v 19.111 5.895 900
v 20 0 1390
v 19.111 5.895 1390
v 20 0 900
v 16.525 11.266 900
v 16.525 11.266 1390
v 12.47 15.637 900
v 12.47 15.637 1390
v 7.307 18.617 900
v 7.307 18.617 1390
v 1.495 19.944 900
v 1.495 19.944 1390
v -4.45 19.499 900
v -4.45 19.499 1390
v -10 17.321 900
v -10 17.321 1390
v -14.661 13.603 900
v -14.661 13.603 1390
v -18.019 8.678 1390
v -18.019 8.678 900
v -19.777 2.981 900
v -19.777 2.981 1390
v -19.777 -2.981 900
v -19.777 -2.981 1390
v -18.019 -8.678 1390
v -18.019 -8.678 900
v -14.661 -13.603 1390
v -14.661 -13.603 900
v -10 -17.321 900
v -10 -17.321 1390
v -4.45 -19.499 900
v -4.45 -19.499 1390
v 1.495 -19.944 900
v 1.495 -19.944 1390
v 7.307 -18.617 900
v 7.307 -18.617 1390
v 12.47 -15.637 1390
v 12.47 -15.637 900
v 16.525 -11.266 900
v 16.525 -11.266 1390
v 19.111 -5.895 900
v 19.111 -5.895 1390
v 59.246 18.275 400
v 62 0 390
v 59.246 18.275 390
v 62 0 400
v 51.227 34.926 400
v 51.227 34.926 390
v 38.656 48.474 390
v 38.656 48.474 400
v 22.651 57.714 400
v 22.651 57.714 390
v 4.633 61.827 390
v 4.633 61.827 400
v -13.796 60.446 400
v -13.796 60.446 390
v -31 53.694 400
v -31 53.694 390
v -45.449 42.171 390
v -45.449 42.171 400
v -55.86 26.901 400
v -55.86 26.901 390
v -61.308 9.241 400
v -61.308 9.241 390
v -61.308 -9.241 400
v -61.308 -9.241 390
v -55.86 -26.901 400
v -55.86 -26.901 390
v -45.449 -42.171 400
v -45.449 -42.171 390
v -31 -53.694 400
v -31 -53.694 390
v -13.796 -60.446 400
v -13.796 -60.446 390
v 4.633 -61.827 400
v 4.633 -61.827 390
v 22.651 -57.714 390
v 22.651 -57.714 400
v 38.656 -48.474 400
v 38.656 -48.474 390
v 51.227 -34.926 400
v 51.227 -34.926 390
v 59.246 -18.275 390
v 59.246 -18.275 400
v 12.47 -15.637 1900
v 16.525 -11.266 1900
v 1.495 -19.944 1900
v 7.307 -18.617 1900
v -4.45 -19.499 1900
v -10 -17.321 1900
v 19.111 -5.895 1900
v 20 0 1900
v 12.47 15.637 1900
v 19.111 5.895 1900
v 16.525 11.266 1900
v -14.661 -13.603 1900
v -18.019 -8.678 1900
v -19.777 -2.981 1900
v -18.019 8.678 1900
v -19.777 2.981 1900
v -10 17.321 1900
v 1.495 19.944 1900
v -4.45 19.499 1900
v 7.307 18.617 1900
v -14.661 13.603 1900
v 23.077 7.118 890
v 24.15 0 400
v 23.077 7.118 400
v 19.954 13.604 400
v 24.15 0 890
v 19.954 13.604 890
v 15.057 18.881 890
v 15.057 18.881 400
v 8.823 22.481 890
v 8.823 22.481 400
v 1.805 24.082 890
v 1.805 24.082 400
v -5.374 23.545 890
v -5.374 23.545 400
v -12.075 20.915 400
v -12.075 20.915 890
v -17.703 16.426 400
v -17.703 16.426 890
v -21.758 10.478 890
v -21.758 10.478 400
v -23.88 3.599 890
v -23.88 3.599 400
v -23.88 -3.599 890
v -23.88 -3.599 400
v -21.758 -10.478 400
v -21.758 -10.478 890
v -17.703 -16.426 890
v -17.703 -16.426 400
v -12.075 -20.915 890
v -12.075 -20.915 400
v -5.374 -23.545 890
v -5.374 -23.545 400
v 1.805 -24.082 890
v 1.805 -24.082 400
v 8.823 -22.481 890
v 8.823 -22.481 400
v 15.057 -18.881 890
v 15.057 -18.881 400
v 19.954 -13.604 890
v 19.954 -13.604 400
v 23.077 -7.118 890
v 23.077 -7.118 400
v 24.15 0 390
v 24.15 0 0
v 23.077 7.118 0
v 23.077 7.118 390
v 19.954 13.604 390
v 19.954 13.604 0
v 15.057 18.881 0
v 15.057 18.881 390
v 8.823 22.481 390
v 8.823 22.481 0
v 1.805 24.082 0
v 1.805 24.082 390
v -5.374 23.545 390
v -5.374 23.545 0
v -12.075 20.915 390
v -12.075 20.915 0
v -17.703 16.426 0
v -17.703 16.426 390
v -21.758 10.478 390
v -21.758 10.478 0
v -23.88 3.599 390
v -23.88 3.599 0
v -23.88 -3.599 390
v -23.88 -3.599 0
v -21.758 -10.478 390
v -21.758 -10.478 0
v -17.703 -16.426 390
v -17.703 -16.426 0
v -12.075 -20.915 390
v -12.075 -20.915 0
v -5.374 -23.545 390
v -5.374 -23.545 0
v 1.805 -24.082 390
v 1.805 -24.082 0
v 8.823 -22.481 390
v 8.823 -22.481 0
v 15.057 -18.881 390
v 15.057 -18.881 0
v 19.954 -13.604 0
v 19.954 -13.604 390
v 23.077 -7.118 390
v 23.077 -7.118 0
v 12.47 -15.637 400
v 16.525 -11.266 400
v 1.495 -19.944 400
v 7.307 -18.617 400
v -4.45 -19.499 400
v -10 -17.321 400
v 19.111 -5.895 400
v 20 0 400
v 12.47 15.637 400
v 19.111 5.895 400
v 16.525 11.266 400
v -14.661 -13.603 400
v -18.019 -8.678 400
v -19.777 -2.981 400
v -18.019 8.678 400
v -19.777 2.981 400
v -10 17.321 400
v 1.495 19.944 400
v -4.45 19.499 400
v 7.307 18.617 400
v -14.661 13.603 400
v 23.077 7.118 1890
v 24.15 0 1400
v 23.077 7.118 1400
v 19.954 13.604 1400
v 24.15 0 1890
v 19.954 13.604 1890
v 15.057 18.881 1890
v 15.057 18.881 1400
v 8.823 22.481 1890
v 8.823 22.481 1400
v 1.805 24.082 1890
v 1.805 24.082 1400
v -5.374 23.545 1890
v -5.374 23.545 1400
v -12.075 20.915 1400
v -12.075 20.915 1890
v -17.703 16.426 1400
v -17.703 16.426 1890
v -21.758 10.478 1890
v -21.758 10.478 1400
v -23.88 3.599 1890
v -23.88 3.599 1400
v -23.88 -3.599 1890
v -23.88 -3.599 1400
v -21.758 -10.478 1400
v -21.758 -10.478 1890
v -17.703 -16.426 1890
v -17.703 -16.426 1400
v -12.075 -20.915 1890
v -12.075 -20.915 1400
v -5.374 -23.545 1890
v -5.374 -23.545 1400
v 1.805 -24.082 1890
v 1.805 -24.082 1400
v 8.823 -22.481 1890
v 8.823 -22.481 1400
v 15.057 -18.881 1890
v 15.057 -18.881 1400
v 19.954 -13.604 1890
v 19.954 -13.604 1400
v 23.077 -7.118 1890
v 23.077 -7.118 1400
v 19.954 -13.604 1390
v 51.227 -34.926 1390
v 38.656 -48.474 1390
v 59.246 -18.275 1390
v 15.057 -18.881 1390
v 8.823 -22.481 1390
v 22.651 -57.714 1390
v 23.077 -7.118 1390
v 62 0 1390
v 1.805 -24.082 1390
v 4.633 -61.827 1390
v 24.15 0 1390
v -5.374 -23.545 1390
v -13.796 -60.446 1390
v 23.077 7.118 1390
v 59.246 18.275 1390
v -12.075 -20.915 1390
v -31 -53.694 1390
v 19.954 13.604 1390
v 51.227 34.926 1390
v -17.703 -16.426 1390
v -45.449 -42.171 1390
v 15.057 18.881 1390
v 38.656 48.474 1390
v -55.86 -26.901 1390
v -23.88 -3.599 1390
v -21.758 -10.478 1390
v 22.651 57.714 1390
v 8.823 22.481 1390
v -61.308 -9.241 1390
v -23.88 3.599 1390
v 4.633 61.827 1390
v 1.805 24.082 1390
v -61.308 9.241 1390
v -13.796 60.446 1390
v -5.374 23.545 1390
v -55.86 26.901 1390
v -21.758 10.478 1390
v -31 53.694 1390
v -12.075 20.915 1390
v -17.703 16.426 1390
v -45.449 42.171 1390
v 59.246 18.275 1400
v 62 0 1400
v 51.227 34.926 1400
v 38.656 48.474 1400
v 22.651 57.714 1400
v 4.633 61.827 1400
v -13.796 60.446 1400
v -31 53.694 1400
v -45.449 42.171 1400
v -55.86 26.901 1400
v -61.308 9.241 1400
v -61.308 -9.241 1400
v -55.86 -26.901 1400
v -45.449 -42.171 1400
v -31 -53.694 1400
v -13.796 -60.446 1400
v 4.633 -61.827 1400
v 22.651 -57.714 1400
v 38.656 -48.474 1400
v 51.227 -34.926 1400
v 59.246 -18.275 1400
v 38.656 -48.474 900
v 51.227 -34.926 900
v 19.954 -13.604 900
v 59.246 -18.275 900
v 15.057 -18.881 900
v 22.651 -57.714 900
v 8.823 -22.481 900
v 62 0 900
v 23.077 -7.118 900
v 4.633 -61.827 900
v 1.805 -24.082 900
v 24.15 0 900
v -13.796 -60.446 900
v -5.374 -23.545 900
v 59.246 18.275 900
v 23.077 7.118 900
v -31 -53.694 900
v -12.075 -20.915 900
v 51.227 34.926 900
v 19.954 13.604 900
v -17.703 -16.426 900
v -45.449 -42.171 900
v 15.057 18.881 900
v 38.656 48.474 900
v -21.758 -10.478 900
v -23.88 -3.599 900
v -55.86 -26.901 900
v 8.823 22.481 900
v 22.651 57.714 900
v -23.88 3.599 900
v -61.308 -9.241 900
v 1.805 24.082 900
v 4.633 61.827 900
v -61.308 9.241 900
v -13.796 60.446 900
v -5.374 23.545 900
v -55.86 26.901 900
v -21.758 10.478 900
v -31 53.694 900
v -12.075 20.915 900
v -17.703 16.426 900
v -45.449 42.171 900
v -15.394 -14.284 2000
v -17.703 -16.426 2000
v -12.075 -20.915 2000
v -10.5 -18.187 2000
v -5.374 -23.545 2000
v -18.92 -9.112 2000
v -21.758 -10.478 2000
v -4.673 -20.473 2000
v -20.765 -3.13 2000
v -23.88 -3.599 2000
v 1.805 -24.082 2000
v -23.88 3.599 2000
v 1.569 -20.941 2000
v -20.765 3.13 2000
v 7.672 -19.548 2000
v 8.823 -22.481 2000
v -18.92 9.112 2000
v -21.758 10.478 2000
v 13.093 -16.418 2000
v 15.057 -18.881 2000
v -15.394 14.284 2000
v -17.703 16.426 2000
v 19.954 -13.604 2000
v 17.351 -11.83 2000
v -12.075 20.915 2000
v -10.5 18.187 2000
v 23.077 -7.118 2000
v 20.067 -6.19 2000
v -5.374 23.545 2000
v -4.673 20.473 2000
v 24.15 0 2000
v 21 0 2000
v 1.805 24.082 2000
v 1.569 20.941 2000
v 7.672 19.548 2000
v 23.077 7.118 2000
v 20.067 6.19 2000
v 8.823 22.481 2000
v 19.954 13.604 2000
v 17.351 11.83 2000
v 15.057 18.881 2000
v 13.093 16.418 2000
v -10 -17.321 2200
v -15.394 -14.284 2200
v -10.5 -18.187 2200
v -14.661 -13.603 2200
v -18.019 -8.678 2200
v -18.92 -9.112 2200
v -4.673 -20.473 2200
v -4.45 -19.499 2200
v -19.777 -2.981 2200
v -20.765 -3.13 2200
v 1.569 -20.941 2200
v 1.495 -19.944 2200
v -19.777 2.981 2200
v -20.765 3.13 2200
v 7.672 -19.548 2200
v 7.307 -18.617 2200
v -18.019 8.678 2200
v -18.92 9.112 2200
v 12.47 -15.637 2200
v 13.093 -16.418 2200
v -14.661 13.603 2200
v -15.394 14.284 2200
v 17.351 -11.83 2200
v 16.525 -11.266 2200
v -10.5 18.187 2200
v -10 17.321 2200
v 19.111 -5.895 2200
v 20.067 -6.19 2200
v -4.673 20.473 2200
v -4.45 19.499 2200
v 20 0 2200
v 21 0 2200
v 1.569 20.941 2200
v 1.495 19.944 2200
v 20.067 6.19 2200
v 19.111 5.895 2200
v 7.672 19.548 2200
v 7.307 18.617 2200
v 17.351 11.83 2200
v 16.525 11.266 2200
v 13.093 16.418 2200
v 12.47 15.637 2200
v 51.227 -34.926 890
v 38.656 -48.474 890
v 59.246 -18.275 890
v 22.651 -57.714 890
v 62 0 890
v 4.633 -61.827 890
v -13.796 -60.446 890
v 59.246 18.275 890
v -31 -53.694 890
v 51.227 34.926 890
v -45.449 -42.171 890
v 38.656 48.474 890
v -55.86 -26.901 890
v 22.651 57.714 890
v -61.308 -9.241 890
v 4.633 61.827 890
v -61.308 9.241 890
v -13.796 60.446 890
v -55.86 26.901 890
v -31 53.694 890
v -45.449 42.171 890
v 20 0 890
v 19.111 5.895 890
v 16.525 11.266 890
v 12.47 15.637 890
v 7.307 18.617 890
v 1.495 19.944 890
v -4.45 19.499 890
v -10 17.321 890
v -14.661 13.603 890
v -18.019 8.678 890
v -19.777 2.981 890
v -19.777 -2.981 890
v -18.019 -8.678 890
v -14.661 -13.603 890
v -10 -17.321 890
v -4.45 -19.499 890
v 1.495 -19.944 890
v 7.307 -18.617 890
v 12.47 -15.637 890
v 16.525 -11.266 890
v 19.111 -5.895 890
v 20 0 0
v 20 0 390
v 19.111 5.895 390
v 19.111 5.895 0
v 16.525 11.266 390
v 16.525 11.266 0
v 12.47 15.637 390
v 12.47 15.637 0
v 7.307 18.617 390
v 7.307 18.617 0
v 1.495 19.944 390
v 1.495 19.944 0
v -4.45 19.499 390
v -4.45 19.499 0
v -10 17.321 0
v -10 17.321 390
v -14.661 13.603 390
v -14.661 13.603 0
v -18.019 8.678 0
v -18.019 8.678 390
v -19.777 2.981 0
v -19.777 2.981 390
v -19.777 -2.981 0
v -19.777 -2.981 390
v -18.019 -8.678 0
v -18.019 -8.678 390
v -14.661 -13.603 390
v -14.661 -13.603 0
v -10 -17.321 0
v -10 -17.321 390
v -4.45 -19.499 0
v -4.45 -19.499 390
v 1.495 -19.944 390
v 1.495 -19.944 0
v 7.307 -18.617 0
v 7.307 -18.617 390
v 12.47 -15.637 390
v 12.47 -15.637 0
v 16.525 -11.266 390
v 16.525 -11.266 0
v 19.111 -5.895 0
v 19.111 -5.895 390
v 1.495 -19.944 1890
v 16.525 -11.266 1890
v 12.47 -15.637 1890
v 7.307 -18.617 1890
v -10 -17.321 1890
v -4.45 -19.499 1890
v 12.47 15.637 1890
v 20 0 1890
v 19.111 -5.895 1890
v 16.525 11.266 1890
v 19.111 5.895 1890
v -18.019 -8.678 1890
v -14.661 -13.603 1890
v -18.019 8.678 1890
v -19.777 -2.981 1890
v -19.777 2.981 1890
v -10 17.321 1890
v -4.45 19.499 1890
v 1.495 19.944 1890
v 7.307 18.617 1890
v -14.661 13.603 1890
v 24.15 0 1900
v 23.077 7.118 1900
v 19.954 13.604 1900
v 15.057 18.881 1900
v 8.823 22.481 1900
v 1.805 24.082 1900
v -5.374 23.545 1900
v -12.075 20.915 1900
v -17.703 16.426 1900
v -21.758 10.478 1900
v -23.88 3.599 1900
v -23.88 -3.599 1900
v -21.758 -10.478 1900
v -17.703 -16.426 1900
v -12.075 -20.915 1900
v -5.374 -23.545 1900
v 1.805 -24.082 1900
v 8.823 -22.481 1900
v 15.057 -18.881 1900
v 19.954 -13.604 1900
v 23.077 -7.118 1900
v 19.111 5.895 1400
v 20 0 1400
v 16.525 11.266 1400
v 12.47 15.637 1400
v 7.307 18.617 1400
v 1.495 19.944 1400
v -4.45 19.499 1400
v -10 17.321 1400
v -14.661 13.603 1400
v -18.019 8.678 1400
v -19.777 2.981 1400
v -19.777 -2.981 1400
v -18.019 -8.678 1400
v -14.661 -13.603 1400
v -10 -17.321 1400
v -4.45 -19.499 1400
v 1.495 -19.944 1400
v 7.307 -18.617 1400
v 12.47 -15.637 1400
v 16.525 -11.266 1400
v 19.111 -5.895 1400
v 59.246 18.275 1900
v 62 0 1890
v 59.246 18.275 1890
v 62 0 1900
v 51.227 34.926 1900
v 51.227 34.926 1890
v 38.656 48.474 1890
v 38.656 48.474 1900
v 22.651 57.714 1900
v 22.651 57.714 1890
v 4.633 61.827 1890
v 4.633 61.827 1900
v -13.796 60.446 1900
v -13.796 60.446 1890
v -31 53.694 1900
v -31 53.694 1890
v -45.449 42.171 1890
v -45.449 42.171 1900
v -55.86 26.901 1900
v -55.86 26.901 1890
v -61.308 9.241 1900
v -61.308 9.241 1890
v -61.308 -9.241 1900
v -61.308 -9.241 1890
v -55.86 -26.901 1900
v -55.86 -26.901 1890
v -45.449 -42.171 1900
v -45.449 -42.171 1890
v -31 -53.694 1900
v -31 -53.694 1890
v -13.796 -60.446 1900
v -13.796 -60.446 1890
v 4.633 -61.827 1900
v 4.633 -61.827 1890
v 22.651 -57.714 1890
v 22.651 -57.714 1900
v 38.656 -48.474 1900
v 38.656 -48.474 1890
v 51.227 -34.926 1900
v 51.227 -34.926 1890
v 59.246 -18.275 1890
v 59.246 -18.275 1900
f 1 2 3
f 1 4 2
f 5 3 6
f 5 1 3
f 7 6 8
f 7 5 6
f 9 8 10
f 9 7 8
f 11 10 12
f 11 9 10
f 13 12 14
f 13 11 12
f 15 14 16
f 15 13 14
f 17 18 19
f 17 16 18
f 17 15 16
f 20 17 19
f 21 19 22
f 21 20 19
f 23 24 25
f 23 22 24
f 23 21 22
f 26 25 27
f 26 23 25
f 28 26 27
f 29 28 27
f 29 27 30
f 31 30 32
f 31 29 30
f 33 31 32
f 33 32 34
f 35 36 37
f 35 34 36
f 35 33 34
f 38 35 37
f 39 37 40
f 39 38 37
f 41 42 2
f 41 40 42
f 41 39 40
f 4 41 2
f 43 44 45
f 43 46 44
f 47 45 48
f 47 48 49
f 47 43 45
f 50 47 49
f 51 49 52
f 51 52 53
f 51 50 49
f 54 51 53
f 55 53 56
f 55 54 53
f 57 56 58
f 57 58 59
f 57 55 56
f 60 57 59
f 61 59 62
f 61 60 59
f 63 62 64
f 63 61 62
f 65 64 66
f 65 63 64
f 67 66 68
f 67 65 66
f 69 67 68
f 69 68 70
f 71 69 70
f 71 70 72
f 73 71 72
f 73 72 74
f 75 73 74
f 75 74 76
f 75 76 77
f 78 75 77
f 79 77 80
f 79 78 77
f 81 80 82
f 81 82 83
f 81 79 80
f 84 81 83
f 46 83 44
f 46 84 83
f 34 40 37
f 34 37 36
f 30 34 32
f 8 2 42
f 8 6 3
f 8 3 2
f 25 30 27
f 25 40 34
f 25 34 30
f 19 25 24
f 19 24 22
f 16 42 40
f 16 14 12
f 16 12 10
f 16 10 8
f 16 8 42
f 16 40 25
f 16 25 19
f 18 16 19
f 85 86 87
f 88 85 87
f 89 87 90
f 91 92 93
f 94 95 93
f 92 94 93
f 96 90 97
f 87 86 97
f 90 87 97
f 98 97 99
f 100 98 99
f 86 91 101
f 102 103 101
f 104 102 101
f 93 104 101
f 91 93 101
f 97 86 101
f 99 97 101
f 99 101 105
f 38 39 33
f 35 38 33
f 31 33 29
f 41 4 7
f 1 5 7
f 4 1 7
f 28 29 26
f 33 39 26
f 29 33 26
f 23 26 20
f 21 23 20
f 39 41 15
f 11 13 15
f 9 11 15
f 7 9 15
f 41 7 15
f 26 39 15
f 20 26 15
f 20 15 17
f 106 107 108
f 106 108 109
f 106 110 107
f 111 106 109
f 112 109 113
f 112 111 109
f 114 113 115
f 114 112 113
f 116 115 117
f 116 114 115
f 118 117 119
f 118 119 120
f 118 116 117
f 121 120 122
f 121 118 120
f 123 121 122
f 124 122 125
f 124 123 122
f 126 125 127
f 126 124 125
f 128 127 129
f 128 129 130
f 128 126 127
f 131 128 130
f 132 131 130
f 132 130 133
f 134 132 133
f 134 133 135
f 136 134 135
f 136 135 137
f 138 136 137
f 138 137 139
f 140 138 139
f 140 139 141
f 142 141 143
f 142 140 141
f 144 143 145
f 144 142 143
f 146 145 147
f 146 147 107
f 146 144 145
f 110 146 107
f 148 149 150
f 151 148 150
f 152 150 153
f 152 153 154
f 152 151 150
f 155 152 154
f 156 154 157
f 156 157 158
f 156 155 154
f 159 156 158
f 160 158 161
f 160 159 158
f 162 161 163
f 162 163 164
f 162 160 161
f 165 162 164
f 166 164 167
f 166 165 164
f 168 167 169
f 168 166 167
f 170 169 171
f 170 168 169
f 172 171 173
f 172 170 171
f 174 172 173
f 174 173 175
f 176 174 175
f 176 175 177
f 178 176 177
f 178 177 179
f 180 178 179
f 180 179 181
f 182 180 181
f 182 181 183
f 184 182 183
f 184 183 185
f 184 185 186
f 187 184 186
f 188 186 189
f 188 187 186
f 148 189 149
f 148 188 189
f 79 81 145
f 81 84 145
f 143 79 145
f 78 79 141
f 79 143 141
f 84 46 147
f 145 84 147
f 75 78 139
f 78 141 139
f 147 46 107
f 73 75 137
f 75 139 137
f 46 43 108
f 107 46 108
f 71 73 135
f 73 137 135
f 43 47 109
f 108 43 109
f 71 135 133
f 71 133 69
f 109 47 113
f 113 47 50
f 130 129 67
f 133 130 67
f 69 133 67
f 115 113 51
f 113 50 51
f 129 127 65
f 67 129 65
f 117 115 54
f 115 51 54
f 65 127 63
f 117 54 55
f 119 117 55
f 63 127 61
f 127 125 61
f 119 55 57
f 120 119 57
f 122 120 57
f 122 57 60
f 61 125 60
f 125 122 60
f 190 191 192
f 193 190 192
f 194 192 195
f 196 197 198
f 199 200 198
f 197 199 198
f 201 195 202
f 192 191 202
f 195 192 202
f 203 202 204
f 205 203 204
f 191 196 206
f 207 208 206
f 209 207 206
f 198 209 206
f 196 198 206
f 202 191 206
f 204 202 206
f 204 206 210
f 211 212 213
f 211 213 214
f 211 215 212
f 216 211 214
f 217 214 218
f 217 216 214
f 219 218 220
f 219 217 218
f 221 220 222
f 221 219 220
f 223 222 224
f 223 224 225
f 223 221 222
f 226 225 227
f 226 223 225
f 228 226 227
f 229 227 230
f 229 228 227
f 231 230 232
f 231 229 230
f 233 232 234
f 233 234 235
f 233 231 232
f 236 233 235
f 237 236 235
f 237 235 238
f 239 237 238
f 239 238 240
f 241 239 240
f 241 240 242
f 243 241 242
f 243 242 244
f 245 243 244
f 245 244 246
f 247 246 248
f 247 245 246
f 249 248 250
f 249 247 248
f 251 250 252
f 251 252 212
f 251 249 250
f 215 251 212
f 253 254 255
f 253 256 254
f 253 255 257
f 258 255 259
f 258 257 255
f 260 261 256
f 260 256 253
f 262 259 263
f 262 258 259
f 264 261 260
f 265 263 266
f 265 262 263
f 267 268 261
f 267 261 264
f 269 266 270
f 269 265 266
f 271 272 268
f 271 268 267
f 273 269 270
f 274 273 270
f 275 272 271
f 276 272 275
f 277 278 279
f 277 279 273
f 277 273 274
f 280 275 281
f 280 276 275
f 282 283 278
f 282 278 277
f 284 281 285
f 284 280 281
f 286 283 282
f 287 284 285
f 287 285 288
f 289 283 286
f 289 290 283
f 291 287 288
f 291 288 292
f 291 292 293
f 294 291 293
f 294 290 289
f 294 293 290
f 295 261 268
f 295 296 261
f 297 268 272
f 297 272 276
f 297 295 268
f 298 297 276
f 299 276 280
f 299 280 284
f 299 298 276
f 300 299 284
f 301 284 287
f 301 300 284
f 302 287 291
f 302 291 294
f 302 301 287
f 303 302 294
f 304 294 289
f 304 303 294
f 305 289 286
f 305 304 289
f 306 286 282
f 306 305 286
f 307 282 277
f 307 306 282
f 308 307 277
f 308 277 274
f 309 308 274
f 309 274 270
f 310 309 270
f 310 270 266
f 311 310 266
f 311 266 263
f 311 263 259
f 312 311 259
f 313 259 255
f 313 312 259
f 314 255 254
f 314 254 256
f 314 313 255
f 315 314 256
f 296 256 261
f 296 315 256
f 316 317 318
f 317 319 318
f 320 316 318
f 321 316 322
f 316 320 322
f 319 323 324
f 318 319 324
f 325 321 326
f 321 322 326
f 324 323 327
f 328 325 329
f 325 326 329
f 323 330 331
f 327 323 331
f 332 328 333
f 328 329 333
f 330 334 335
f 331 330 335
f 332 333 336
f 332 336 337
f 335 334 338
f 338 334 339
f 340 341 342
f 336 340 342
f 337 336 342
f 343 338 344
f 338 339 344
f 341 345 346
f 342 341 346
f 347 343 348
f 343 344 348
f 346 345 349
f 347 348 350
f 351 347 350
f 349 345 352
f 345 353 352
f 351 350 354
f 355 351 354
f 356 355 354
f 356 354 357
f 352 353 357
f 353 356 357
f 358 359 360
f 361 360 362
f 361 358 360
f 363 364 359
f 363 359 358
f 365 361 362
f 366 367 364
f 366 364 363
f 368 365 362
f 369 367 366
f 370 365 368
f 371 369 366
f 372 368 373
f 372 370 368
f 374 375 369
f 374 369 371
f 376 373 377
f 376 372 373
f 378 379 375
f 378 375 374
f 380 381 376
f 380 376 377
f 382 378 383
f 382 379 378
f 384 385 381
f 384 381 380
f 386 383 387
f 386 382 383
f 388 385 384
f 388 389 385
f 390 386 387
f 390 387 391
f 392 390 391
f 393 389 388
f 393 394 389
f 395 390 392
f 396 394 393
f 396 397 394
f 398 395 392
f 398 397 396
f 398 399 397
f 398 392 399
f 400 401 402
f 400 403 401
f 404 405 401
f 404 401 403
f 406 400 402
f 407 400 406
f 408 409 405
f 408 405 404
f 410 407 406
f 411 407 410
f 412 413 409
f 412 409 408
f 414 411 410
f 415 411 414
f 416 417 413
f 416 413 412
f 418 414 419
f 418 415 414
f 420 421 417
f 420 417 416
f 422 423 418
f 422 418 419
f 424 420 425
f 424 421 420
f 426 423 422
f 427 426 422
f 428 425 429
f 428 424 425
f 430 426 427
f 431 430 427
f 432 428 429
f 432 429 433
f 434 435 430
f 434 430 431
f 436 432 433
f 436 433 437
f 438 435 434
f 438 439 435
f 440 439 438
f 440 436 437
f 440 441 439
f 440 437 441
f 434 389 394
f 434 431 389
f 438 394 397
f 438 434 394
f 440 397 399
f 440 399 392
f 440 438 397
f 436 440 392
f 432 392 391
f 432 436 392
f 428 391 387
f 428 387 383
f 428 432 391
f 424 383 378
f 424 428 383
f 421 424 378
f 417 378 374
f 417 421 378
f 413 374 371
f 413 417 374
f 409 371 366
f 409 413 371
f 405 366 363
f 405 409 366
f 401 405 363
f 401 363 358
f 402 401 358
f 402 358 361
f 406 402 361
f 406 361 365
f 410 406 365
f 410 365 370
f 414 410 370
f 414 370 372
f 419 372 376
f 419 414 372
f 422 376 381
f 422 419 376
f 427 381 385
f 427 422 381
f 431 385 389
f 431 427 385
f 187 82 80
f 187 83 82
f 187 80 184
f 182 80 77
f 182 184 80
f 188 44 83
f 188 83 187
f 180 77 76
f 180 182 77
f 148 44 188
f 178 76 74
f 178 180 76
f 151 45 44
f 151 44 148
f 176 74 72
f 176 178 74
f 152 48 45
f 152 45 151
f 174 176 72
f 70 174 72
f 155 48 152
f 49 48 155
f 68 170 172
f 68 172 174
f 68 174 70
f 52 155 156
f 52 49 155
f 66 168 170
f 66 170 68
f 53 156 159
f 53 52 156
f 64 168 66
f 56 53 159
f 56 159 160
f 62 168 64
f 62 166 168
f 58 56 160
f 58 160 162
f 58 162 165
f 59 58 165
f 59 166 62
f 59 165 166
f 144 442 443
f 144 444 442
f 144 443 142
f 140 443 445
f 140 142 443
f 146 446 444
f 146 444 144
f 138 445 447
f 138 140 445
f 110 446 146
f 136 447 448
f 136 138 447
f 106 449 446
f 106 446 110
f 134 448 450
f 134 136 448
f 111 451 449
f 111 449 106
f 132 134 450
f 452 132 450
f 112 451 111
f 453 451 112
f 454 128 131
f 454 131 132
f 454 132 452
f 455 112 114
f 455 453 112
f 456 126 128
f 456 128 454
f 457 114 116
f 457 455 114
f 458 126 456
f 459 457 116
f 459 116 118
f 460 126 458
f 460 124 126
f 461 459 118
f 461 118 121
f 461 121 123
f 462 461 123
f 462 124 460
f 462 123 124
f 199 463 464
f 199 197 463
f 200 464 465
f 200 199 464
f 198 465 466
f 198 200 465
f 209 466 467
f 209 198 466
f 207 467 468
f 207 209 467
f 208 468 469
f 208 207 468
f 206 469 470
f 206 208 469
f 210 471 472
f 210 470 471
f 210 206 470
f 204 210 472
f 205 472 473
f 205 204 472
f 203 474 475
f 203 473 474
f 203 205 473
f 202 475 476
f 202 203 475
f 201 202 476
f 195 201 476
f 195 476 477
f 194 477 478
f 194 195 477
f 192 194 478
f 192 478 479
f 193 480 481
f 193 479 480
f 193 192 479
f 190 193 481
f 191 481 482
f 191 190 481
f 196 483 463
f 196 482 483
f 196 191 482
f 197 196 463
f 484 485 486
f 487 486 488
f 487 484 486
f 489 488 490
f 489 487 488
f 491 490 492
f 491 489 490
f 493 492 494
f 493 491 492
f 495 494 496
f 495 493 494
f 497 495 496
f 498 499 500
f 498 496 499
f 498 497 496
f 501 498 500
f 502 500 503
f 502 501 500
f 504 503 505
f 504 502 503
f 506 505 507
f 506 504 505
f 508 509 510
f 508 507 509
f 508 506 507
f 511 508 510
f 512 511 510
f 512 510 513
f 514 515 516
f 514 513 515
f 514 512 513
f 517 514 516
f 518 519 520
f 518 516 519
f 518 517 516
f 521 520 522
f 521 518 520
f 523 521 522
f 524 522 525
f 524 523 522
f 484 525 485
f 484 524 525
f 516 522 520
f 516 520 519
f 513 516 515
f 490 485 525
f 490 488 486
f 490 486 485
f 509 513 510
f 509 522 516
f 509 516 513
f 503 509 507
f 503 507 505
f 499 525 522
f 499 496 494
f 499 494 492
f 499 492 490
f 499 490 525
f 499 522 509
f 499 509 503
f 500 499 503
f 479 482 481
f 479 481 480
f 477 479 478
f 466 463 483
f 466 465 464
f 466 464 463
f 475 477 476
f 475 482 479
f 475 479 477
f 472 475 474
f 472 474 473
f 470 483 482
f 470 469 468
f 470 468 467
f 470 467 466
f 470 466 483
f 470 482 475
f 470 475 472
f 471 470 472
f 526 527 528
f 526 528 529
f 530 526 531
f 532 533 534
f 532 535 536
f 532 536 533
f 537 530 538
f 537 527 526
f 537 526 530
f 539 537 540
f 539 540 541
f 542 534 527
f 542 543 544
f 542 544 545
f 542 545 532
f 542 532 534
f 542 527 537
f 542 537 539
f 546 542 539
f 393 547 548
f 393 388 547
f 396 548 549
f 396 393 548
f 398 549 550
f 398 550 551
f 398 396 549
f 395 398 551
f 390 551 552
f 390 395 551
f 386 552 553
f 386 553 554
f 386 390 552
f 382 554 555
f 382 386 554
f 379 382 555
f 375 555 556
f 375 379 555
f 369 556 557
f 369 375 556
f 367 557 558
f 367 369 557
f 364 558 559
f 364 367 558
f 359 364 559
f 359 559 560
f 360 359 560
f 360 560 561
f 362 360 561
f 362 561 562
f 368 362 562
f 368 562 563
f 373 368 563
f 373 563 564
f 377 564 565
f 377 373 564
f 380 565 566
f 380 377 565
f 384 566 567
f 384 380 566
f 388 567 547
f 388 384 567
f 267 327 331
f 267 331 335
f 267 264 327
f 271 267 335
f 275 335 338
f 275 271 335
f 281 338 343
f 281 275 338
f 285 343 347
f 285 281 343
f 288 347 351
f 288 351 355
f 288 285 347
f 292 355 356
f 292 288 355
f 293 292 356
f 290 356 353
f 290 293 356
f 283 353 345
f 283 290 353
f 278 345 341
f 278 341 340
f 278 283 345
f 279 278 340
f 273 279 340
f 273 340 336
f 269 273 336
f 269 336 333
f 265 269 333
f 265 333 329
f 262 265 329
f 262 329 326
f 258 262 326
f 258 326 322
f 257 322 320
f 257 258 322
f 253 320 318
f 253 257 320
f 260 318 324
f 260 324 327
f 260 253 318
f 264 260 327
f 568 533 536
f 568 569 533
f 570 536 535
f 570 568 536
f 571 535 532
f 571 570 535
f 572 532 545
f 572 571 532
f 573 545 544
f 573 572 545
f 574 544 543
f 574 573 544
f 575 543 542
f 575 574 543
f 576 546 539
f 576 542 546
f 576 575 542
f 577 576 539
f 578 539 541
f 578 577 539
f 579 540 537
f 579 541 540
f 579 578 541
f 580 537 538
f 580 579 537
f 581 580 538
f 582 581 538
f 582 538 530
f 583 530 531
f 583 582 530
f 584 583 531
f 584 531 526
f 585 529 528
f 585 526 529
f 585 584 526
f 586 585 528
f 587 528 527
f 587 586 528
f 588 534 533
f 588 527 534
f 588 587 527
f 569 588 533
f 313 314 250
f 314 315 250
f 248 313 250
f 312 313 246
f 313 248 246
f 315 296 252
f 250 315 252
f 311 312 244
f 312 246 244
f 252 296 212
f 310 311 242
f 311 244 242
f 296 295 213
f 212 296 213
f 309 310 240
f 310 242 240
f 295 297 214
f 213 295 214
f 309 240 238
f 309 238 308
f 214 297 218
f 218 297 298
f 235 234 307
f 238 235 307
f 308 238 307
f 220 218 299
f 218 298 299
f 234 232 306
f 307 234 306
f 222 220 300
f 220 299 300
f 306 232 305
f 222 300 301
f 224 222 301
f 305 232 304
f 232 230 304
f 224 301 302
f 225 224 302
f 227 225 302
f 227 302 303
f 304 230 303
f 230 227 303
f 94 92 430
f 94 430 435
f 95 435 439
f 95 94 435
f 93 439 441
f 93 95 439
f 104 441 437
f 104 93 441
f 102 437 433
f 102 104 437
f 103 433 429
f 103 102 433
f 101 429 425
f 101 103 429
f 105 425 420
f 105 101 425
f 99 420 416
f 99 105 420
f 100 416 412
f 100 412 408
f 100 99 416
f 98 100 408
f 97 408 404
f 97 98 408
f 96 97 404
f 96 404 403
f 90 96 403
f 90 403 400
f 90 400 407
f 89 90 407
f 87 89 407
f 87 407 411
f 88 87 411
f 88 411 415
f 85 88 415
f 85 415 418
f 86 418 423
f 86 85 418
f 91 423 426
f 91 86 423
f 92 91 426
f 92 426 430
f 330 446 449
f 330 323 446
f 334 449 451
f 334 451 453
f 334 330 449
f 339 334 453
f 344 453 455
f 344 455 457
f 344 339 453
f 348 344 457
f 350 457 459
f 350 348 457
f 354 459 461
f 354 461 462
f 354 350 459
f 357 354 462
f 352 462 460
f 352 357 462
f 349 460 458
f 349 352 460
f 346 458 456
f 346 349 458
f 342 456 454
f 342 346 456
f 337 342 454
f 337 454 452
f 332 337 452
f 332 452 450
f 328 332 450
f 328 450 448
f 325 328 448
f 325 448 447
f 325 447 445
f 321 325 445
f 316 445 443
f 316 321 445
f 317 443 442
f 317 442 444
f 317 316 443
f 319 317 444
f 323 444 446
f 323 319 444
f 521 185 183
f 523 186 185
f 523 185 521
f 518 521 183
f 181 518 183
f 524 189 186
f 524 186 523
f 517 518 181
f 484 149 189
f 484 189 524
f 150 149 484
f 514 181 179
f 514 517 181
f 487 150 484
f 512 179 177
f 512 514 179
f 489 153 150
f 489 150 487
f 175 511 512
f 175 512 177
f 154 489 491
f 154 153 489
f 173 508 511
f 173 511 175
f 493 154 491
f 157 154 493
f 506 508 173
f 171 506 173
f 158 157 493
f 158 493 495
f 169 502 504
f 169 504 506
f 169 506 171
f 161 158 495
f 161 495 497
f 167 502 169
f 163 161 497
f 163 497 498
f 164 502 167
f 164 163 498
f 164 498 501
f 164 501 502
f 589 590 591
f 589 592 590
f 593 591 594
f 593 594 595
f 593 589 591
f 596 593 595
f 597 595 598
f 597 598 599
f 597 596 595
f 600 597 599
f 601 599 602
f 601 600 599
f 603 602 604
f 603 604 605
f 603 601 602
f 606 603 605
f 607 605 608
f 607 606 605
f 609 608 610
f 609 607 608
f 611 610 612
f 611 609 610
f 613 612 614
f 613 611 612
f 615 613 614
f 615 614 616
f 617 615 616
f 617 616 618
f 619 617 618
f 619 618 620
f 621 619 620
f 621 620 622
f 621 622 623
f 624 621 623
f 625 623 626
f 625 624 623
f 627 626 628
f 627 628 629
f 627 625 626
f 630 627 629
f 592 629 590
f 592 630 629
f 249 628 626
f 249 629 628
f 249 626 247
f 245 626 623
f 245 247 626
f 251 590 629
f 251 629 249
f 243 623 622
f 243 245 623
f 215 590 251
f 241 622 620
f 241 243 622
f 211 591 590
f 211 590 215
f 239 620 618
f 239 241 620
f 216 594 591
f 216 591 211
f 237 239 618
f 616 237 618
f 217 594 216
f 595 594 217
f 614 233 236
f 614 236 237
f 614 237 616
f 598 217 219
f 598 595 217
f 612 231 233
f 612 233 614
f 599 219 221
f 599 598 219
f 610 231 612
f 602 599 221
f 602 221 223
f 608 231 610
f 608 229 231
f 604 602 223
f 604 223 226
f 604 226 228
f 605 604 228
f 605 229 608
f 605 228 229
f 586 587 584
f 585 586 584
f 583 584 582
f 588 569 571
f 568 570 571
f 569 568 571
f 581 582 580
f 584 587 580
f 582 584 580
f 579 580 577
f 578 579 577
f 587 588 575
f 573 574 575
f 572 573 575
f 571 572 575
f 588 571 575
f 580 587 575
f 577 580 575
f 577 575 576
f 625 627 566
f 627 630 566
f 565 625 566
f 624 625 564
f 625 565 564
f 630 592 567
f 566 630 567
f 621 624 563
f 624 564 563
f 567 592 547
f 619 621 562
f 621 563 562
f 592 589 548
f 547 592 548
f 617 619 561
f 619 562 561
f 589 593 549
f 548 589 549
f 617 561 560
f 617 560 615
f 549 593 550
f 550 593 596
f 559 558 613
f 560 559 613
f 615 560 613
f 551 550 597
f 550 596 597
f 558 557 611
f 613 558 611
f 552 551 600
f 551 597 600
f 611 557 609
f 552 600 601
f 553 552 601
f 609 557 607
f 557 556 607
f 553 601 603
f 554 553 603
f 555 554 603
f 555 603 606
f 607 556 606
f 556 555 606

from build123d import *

# Parameters (mm, degrees)
F2_W = 62
F2_H = 10


with BuildPart() as f1:
    # F0 (on Front) → F1 (revolve)
    with BuildSketch(Plane.XZ):
        Polygon((20, 400), (20, 0), (24.15, 0), (24.15, 2000), (21, 2000), (21, 2200), (20, 2200), (20, 1501.37949), align=None)
    revolve(axis=Axis((0, 0, 1100), (0, 0, 1)))

    # F2 (on Front) → F3 (revolve)
    with BuildSketch(Plane.XZ):
        with Locations((31, 395)):
            Rectangle(F2_W, F2_H)
        with Locations((31, 895)):
            Rectangle(F2_W, F2_H)
        with Locations((31, 1395)):
            Rectangle(F2_W, F2_H)
        with Locations((31, 1895)):
            Rectangle(F2_W, F2_H)
    revolve(axis=Axis((0, 0, 197.5), (0, 0, 1)))


solid = f1.part
